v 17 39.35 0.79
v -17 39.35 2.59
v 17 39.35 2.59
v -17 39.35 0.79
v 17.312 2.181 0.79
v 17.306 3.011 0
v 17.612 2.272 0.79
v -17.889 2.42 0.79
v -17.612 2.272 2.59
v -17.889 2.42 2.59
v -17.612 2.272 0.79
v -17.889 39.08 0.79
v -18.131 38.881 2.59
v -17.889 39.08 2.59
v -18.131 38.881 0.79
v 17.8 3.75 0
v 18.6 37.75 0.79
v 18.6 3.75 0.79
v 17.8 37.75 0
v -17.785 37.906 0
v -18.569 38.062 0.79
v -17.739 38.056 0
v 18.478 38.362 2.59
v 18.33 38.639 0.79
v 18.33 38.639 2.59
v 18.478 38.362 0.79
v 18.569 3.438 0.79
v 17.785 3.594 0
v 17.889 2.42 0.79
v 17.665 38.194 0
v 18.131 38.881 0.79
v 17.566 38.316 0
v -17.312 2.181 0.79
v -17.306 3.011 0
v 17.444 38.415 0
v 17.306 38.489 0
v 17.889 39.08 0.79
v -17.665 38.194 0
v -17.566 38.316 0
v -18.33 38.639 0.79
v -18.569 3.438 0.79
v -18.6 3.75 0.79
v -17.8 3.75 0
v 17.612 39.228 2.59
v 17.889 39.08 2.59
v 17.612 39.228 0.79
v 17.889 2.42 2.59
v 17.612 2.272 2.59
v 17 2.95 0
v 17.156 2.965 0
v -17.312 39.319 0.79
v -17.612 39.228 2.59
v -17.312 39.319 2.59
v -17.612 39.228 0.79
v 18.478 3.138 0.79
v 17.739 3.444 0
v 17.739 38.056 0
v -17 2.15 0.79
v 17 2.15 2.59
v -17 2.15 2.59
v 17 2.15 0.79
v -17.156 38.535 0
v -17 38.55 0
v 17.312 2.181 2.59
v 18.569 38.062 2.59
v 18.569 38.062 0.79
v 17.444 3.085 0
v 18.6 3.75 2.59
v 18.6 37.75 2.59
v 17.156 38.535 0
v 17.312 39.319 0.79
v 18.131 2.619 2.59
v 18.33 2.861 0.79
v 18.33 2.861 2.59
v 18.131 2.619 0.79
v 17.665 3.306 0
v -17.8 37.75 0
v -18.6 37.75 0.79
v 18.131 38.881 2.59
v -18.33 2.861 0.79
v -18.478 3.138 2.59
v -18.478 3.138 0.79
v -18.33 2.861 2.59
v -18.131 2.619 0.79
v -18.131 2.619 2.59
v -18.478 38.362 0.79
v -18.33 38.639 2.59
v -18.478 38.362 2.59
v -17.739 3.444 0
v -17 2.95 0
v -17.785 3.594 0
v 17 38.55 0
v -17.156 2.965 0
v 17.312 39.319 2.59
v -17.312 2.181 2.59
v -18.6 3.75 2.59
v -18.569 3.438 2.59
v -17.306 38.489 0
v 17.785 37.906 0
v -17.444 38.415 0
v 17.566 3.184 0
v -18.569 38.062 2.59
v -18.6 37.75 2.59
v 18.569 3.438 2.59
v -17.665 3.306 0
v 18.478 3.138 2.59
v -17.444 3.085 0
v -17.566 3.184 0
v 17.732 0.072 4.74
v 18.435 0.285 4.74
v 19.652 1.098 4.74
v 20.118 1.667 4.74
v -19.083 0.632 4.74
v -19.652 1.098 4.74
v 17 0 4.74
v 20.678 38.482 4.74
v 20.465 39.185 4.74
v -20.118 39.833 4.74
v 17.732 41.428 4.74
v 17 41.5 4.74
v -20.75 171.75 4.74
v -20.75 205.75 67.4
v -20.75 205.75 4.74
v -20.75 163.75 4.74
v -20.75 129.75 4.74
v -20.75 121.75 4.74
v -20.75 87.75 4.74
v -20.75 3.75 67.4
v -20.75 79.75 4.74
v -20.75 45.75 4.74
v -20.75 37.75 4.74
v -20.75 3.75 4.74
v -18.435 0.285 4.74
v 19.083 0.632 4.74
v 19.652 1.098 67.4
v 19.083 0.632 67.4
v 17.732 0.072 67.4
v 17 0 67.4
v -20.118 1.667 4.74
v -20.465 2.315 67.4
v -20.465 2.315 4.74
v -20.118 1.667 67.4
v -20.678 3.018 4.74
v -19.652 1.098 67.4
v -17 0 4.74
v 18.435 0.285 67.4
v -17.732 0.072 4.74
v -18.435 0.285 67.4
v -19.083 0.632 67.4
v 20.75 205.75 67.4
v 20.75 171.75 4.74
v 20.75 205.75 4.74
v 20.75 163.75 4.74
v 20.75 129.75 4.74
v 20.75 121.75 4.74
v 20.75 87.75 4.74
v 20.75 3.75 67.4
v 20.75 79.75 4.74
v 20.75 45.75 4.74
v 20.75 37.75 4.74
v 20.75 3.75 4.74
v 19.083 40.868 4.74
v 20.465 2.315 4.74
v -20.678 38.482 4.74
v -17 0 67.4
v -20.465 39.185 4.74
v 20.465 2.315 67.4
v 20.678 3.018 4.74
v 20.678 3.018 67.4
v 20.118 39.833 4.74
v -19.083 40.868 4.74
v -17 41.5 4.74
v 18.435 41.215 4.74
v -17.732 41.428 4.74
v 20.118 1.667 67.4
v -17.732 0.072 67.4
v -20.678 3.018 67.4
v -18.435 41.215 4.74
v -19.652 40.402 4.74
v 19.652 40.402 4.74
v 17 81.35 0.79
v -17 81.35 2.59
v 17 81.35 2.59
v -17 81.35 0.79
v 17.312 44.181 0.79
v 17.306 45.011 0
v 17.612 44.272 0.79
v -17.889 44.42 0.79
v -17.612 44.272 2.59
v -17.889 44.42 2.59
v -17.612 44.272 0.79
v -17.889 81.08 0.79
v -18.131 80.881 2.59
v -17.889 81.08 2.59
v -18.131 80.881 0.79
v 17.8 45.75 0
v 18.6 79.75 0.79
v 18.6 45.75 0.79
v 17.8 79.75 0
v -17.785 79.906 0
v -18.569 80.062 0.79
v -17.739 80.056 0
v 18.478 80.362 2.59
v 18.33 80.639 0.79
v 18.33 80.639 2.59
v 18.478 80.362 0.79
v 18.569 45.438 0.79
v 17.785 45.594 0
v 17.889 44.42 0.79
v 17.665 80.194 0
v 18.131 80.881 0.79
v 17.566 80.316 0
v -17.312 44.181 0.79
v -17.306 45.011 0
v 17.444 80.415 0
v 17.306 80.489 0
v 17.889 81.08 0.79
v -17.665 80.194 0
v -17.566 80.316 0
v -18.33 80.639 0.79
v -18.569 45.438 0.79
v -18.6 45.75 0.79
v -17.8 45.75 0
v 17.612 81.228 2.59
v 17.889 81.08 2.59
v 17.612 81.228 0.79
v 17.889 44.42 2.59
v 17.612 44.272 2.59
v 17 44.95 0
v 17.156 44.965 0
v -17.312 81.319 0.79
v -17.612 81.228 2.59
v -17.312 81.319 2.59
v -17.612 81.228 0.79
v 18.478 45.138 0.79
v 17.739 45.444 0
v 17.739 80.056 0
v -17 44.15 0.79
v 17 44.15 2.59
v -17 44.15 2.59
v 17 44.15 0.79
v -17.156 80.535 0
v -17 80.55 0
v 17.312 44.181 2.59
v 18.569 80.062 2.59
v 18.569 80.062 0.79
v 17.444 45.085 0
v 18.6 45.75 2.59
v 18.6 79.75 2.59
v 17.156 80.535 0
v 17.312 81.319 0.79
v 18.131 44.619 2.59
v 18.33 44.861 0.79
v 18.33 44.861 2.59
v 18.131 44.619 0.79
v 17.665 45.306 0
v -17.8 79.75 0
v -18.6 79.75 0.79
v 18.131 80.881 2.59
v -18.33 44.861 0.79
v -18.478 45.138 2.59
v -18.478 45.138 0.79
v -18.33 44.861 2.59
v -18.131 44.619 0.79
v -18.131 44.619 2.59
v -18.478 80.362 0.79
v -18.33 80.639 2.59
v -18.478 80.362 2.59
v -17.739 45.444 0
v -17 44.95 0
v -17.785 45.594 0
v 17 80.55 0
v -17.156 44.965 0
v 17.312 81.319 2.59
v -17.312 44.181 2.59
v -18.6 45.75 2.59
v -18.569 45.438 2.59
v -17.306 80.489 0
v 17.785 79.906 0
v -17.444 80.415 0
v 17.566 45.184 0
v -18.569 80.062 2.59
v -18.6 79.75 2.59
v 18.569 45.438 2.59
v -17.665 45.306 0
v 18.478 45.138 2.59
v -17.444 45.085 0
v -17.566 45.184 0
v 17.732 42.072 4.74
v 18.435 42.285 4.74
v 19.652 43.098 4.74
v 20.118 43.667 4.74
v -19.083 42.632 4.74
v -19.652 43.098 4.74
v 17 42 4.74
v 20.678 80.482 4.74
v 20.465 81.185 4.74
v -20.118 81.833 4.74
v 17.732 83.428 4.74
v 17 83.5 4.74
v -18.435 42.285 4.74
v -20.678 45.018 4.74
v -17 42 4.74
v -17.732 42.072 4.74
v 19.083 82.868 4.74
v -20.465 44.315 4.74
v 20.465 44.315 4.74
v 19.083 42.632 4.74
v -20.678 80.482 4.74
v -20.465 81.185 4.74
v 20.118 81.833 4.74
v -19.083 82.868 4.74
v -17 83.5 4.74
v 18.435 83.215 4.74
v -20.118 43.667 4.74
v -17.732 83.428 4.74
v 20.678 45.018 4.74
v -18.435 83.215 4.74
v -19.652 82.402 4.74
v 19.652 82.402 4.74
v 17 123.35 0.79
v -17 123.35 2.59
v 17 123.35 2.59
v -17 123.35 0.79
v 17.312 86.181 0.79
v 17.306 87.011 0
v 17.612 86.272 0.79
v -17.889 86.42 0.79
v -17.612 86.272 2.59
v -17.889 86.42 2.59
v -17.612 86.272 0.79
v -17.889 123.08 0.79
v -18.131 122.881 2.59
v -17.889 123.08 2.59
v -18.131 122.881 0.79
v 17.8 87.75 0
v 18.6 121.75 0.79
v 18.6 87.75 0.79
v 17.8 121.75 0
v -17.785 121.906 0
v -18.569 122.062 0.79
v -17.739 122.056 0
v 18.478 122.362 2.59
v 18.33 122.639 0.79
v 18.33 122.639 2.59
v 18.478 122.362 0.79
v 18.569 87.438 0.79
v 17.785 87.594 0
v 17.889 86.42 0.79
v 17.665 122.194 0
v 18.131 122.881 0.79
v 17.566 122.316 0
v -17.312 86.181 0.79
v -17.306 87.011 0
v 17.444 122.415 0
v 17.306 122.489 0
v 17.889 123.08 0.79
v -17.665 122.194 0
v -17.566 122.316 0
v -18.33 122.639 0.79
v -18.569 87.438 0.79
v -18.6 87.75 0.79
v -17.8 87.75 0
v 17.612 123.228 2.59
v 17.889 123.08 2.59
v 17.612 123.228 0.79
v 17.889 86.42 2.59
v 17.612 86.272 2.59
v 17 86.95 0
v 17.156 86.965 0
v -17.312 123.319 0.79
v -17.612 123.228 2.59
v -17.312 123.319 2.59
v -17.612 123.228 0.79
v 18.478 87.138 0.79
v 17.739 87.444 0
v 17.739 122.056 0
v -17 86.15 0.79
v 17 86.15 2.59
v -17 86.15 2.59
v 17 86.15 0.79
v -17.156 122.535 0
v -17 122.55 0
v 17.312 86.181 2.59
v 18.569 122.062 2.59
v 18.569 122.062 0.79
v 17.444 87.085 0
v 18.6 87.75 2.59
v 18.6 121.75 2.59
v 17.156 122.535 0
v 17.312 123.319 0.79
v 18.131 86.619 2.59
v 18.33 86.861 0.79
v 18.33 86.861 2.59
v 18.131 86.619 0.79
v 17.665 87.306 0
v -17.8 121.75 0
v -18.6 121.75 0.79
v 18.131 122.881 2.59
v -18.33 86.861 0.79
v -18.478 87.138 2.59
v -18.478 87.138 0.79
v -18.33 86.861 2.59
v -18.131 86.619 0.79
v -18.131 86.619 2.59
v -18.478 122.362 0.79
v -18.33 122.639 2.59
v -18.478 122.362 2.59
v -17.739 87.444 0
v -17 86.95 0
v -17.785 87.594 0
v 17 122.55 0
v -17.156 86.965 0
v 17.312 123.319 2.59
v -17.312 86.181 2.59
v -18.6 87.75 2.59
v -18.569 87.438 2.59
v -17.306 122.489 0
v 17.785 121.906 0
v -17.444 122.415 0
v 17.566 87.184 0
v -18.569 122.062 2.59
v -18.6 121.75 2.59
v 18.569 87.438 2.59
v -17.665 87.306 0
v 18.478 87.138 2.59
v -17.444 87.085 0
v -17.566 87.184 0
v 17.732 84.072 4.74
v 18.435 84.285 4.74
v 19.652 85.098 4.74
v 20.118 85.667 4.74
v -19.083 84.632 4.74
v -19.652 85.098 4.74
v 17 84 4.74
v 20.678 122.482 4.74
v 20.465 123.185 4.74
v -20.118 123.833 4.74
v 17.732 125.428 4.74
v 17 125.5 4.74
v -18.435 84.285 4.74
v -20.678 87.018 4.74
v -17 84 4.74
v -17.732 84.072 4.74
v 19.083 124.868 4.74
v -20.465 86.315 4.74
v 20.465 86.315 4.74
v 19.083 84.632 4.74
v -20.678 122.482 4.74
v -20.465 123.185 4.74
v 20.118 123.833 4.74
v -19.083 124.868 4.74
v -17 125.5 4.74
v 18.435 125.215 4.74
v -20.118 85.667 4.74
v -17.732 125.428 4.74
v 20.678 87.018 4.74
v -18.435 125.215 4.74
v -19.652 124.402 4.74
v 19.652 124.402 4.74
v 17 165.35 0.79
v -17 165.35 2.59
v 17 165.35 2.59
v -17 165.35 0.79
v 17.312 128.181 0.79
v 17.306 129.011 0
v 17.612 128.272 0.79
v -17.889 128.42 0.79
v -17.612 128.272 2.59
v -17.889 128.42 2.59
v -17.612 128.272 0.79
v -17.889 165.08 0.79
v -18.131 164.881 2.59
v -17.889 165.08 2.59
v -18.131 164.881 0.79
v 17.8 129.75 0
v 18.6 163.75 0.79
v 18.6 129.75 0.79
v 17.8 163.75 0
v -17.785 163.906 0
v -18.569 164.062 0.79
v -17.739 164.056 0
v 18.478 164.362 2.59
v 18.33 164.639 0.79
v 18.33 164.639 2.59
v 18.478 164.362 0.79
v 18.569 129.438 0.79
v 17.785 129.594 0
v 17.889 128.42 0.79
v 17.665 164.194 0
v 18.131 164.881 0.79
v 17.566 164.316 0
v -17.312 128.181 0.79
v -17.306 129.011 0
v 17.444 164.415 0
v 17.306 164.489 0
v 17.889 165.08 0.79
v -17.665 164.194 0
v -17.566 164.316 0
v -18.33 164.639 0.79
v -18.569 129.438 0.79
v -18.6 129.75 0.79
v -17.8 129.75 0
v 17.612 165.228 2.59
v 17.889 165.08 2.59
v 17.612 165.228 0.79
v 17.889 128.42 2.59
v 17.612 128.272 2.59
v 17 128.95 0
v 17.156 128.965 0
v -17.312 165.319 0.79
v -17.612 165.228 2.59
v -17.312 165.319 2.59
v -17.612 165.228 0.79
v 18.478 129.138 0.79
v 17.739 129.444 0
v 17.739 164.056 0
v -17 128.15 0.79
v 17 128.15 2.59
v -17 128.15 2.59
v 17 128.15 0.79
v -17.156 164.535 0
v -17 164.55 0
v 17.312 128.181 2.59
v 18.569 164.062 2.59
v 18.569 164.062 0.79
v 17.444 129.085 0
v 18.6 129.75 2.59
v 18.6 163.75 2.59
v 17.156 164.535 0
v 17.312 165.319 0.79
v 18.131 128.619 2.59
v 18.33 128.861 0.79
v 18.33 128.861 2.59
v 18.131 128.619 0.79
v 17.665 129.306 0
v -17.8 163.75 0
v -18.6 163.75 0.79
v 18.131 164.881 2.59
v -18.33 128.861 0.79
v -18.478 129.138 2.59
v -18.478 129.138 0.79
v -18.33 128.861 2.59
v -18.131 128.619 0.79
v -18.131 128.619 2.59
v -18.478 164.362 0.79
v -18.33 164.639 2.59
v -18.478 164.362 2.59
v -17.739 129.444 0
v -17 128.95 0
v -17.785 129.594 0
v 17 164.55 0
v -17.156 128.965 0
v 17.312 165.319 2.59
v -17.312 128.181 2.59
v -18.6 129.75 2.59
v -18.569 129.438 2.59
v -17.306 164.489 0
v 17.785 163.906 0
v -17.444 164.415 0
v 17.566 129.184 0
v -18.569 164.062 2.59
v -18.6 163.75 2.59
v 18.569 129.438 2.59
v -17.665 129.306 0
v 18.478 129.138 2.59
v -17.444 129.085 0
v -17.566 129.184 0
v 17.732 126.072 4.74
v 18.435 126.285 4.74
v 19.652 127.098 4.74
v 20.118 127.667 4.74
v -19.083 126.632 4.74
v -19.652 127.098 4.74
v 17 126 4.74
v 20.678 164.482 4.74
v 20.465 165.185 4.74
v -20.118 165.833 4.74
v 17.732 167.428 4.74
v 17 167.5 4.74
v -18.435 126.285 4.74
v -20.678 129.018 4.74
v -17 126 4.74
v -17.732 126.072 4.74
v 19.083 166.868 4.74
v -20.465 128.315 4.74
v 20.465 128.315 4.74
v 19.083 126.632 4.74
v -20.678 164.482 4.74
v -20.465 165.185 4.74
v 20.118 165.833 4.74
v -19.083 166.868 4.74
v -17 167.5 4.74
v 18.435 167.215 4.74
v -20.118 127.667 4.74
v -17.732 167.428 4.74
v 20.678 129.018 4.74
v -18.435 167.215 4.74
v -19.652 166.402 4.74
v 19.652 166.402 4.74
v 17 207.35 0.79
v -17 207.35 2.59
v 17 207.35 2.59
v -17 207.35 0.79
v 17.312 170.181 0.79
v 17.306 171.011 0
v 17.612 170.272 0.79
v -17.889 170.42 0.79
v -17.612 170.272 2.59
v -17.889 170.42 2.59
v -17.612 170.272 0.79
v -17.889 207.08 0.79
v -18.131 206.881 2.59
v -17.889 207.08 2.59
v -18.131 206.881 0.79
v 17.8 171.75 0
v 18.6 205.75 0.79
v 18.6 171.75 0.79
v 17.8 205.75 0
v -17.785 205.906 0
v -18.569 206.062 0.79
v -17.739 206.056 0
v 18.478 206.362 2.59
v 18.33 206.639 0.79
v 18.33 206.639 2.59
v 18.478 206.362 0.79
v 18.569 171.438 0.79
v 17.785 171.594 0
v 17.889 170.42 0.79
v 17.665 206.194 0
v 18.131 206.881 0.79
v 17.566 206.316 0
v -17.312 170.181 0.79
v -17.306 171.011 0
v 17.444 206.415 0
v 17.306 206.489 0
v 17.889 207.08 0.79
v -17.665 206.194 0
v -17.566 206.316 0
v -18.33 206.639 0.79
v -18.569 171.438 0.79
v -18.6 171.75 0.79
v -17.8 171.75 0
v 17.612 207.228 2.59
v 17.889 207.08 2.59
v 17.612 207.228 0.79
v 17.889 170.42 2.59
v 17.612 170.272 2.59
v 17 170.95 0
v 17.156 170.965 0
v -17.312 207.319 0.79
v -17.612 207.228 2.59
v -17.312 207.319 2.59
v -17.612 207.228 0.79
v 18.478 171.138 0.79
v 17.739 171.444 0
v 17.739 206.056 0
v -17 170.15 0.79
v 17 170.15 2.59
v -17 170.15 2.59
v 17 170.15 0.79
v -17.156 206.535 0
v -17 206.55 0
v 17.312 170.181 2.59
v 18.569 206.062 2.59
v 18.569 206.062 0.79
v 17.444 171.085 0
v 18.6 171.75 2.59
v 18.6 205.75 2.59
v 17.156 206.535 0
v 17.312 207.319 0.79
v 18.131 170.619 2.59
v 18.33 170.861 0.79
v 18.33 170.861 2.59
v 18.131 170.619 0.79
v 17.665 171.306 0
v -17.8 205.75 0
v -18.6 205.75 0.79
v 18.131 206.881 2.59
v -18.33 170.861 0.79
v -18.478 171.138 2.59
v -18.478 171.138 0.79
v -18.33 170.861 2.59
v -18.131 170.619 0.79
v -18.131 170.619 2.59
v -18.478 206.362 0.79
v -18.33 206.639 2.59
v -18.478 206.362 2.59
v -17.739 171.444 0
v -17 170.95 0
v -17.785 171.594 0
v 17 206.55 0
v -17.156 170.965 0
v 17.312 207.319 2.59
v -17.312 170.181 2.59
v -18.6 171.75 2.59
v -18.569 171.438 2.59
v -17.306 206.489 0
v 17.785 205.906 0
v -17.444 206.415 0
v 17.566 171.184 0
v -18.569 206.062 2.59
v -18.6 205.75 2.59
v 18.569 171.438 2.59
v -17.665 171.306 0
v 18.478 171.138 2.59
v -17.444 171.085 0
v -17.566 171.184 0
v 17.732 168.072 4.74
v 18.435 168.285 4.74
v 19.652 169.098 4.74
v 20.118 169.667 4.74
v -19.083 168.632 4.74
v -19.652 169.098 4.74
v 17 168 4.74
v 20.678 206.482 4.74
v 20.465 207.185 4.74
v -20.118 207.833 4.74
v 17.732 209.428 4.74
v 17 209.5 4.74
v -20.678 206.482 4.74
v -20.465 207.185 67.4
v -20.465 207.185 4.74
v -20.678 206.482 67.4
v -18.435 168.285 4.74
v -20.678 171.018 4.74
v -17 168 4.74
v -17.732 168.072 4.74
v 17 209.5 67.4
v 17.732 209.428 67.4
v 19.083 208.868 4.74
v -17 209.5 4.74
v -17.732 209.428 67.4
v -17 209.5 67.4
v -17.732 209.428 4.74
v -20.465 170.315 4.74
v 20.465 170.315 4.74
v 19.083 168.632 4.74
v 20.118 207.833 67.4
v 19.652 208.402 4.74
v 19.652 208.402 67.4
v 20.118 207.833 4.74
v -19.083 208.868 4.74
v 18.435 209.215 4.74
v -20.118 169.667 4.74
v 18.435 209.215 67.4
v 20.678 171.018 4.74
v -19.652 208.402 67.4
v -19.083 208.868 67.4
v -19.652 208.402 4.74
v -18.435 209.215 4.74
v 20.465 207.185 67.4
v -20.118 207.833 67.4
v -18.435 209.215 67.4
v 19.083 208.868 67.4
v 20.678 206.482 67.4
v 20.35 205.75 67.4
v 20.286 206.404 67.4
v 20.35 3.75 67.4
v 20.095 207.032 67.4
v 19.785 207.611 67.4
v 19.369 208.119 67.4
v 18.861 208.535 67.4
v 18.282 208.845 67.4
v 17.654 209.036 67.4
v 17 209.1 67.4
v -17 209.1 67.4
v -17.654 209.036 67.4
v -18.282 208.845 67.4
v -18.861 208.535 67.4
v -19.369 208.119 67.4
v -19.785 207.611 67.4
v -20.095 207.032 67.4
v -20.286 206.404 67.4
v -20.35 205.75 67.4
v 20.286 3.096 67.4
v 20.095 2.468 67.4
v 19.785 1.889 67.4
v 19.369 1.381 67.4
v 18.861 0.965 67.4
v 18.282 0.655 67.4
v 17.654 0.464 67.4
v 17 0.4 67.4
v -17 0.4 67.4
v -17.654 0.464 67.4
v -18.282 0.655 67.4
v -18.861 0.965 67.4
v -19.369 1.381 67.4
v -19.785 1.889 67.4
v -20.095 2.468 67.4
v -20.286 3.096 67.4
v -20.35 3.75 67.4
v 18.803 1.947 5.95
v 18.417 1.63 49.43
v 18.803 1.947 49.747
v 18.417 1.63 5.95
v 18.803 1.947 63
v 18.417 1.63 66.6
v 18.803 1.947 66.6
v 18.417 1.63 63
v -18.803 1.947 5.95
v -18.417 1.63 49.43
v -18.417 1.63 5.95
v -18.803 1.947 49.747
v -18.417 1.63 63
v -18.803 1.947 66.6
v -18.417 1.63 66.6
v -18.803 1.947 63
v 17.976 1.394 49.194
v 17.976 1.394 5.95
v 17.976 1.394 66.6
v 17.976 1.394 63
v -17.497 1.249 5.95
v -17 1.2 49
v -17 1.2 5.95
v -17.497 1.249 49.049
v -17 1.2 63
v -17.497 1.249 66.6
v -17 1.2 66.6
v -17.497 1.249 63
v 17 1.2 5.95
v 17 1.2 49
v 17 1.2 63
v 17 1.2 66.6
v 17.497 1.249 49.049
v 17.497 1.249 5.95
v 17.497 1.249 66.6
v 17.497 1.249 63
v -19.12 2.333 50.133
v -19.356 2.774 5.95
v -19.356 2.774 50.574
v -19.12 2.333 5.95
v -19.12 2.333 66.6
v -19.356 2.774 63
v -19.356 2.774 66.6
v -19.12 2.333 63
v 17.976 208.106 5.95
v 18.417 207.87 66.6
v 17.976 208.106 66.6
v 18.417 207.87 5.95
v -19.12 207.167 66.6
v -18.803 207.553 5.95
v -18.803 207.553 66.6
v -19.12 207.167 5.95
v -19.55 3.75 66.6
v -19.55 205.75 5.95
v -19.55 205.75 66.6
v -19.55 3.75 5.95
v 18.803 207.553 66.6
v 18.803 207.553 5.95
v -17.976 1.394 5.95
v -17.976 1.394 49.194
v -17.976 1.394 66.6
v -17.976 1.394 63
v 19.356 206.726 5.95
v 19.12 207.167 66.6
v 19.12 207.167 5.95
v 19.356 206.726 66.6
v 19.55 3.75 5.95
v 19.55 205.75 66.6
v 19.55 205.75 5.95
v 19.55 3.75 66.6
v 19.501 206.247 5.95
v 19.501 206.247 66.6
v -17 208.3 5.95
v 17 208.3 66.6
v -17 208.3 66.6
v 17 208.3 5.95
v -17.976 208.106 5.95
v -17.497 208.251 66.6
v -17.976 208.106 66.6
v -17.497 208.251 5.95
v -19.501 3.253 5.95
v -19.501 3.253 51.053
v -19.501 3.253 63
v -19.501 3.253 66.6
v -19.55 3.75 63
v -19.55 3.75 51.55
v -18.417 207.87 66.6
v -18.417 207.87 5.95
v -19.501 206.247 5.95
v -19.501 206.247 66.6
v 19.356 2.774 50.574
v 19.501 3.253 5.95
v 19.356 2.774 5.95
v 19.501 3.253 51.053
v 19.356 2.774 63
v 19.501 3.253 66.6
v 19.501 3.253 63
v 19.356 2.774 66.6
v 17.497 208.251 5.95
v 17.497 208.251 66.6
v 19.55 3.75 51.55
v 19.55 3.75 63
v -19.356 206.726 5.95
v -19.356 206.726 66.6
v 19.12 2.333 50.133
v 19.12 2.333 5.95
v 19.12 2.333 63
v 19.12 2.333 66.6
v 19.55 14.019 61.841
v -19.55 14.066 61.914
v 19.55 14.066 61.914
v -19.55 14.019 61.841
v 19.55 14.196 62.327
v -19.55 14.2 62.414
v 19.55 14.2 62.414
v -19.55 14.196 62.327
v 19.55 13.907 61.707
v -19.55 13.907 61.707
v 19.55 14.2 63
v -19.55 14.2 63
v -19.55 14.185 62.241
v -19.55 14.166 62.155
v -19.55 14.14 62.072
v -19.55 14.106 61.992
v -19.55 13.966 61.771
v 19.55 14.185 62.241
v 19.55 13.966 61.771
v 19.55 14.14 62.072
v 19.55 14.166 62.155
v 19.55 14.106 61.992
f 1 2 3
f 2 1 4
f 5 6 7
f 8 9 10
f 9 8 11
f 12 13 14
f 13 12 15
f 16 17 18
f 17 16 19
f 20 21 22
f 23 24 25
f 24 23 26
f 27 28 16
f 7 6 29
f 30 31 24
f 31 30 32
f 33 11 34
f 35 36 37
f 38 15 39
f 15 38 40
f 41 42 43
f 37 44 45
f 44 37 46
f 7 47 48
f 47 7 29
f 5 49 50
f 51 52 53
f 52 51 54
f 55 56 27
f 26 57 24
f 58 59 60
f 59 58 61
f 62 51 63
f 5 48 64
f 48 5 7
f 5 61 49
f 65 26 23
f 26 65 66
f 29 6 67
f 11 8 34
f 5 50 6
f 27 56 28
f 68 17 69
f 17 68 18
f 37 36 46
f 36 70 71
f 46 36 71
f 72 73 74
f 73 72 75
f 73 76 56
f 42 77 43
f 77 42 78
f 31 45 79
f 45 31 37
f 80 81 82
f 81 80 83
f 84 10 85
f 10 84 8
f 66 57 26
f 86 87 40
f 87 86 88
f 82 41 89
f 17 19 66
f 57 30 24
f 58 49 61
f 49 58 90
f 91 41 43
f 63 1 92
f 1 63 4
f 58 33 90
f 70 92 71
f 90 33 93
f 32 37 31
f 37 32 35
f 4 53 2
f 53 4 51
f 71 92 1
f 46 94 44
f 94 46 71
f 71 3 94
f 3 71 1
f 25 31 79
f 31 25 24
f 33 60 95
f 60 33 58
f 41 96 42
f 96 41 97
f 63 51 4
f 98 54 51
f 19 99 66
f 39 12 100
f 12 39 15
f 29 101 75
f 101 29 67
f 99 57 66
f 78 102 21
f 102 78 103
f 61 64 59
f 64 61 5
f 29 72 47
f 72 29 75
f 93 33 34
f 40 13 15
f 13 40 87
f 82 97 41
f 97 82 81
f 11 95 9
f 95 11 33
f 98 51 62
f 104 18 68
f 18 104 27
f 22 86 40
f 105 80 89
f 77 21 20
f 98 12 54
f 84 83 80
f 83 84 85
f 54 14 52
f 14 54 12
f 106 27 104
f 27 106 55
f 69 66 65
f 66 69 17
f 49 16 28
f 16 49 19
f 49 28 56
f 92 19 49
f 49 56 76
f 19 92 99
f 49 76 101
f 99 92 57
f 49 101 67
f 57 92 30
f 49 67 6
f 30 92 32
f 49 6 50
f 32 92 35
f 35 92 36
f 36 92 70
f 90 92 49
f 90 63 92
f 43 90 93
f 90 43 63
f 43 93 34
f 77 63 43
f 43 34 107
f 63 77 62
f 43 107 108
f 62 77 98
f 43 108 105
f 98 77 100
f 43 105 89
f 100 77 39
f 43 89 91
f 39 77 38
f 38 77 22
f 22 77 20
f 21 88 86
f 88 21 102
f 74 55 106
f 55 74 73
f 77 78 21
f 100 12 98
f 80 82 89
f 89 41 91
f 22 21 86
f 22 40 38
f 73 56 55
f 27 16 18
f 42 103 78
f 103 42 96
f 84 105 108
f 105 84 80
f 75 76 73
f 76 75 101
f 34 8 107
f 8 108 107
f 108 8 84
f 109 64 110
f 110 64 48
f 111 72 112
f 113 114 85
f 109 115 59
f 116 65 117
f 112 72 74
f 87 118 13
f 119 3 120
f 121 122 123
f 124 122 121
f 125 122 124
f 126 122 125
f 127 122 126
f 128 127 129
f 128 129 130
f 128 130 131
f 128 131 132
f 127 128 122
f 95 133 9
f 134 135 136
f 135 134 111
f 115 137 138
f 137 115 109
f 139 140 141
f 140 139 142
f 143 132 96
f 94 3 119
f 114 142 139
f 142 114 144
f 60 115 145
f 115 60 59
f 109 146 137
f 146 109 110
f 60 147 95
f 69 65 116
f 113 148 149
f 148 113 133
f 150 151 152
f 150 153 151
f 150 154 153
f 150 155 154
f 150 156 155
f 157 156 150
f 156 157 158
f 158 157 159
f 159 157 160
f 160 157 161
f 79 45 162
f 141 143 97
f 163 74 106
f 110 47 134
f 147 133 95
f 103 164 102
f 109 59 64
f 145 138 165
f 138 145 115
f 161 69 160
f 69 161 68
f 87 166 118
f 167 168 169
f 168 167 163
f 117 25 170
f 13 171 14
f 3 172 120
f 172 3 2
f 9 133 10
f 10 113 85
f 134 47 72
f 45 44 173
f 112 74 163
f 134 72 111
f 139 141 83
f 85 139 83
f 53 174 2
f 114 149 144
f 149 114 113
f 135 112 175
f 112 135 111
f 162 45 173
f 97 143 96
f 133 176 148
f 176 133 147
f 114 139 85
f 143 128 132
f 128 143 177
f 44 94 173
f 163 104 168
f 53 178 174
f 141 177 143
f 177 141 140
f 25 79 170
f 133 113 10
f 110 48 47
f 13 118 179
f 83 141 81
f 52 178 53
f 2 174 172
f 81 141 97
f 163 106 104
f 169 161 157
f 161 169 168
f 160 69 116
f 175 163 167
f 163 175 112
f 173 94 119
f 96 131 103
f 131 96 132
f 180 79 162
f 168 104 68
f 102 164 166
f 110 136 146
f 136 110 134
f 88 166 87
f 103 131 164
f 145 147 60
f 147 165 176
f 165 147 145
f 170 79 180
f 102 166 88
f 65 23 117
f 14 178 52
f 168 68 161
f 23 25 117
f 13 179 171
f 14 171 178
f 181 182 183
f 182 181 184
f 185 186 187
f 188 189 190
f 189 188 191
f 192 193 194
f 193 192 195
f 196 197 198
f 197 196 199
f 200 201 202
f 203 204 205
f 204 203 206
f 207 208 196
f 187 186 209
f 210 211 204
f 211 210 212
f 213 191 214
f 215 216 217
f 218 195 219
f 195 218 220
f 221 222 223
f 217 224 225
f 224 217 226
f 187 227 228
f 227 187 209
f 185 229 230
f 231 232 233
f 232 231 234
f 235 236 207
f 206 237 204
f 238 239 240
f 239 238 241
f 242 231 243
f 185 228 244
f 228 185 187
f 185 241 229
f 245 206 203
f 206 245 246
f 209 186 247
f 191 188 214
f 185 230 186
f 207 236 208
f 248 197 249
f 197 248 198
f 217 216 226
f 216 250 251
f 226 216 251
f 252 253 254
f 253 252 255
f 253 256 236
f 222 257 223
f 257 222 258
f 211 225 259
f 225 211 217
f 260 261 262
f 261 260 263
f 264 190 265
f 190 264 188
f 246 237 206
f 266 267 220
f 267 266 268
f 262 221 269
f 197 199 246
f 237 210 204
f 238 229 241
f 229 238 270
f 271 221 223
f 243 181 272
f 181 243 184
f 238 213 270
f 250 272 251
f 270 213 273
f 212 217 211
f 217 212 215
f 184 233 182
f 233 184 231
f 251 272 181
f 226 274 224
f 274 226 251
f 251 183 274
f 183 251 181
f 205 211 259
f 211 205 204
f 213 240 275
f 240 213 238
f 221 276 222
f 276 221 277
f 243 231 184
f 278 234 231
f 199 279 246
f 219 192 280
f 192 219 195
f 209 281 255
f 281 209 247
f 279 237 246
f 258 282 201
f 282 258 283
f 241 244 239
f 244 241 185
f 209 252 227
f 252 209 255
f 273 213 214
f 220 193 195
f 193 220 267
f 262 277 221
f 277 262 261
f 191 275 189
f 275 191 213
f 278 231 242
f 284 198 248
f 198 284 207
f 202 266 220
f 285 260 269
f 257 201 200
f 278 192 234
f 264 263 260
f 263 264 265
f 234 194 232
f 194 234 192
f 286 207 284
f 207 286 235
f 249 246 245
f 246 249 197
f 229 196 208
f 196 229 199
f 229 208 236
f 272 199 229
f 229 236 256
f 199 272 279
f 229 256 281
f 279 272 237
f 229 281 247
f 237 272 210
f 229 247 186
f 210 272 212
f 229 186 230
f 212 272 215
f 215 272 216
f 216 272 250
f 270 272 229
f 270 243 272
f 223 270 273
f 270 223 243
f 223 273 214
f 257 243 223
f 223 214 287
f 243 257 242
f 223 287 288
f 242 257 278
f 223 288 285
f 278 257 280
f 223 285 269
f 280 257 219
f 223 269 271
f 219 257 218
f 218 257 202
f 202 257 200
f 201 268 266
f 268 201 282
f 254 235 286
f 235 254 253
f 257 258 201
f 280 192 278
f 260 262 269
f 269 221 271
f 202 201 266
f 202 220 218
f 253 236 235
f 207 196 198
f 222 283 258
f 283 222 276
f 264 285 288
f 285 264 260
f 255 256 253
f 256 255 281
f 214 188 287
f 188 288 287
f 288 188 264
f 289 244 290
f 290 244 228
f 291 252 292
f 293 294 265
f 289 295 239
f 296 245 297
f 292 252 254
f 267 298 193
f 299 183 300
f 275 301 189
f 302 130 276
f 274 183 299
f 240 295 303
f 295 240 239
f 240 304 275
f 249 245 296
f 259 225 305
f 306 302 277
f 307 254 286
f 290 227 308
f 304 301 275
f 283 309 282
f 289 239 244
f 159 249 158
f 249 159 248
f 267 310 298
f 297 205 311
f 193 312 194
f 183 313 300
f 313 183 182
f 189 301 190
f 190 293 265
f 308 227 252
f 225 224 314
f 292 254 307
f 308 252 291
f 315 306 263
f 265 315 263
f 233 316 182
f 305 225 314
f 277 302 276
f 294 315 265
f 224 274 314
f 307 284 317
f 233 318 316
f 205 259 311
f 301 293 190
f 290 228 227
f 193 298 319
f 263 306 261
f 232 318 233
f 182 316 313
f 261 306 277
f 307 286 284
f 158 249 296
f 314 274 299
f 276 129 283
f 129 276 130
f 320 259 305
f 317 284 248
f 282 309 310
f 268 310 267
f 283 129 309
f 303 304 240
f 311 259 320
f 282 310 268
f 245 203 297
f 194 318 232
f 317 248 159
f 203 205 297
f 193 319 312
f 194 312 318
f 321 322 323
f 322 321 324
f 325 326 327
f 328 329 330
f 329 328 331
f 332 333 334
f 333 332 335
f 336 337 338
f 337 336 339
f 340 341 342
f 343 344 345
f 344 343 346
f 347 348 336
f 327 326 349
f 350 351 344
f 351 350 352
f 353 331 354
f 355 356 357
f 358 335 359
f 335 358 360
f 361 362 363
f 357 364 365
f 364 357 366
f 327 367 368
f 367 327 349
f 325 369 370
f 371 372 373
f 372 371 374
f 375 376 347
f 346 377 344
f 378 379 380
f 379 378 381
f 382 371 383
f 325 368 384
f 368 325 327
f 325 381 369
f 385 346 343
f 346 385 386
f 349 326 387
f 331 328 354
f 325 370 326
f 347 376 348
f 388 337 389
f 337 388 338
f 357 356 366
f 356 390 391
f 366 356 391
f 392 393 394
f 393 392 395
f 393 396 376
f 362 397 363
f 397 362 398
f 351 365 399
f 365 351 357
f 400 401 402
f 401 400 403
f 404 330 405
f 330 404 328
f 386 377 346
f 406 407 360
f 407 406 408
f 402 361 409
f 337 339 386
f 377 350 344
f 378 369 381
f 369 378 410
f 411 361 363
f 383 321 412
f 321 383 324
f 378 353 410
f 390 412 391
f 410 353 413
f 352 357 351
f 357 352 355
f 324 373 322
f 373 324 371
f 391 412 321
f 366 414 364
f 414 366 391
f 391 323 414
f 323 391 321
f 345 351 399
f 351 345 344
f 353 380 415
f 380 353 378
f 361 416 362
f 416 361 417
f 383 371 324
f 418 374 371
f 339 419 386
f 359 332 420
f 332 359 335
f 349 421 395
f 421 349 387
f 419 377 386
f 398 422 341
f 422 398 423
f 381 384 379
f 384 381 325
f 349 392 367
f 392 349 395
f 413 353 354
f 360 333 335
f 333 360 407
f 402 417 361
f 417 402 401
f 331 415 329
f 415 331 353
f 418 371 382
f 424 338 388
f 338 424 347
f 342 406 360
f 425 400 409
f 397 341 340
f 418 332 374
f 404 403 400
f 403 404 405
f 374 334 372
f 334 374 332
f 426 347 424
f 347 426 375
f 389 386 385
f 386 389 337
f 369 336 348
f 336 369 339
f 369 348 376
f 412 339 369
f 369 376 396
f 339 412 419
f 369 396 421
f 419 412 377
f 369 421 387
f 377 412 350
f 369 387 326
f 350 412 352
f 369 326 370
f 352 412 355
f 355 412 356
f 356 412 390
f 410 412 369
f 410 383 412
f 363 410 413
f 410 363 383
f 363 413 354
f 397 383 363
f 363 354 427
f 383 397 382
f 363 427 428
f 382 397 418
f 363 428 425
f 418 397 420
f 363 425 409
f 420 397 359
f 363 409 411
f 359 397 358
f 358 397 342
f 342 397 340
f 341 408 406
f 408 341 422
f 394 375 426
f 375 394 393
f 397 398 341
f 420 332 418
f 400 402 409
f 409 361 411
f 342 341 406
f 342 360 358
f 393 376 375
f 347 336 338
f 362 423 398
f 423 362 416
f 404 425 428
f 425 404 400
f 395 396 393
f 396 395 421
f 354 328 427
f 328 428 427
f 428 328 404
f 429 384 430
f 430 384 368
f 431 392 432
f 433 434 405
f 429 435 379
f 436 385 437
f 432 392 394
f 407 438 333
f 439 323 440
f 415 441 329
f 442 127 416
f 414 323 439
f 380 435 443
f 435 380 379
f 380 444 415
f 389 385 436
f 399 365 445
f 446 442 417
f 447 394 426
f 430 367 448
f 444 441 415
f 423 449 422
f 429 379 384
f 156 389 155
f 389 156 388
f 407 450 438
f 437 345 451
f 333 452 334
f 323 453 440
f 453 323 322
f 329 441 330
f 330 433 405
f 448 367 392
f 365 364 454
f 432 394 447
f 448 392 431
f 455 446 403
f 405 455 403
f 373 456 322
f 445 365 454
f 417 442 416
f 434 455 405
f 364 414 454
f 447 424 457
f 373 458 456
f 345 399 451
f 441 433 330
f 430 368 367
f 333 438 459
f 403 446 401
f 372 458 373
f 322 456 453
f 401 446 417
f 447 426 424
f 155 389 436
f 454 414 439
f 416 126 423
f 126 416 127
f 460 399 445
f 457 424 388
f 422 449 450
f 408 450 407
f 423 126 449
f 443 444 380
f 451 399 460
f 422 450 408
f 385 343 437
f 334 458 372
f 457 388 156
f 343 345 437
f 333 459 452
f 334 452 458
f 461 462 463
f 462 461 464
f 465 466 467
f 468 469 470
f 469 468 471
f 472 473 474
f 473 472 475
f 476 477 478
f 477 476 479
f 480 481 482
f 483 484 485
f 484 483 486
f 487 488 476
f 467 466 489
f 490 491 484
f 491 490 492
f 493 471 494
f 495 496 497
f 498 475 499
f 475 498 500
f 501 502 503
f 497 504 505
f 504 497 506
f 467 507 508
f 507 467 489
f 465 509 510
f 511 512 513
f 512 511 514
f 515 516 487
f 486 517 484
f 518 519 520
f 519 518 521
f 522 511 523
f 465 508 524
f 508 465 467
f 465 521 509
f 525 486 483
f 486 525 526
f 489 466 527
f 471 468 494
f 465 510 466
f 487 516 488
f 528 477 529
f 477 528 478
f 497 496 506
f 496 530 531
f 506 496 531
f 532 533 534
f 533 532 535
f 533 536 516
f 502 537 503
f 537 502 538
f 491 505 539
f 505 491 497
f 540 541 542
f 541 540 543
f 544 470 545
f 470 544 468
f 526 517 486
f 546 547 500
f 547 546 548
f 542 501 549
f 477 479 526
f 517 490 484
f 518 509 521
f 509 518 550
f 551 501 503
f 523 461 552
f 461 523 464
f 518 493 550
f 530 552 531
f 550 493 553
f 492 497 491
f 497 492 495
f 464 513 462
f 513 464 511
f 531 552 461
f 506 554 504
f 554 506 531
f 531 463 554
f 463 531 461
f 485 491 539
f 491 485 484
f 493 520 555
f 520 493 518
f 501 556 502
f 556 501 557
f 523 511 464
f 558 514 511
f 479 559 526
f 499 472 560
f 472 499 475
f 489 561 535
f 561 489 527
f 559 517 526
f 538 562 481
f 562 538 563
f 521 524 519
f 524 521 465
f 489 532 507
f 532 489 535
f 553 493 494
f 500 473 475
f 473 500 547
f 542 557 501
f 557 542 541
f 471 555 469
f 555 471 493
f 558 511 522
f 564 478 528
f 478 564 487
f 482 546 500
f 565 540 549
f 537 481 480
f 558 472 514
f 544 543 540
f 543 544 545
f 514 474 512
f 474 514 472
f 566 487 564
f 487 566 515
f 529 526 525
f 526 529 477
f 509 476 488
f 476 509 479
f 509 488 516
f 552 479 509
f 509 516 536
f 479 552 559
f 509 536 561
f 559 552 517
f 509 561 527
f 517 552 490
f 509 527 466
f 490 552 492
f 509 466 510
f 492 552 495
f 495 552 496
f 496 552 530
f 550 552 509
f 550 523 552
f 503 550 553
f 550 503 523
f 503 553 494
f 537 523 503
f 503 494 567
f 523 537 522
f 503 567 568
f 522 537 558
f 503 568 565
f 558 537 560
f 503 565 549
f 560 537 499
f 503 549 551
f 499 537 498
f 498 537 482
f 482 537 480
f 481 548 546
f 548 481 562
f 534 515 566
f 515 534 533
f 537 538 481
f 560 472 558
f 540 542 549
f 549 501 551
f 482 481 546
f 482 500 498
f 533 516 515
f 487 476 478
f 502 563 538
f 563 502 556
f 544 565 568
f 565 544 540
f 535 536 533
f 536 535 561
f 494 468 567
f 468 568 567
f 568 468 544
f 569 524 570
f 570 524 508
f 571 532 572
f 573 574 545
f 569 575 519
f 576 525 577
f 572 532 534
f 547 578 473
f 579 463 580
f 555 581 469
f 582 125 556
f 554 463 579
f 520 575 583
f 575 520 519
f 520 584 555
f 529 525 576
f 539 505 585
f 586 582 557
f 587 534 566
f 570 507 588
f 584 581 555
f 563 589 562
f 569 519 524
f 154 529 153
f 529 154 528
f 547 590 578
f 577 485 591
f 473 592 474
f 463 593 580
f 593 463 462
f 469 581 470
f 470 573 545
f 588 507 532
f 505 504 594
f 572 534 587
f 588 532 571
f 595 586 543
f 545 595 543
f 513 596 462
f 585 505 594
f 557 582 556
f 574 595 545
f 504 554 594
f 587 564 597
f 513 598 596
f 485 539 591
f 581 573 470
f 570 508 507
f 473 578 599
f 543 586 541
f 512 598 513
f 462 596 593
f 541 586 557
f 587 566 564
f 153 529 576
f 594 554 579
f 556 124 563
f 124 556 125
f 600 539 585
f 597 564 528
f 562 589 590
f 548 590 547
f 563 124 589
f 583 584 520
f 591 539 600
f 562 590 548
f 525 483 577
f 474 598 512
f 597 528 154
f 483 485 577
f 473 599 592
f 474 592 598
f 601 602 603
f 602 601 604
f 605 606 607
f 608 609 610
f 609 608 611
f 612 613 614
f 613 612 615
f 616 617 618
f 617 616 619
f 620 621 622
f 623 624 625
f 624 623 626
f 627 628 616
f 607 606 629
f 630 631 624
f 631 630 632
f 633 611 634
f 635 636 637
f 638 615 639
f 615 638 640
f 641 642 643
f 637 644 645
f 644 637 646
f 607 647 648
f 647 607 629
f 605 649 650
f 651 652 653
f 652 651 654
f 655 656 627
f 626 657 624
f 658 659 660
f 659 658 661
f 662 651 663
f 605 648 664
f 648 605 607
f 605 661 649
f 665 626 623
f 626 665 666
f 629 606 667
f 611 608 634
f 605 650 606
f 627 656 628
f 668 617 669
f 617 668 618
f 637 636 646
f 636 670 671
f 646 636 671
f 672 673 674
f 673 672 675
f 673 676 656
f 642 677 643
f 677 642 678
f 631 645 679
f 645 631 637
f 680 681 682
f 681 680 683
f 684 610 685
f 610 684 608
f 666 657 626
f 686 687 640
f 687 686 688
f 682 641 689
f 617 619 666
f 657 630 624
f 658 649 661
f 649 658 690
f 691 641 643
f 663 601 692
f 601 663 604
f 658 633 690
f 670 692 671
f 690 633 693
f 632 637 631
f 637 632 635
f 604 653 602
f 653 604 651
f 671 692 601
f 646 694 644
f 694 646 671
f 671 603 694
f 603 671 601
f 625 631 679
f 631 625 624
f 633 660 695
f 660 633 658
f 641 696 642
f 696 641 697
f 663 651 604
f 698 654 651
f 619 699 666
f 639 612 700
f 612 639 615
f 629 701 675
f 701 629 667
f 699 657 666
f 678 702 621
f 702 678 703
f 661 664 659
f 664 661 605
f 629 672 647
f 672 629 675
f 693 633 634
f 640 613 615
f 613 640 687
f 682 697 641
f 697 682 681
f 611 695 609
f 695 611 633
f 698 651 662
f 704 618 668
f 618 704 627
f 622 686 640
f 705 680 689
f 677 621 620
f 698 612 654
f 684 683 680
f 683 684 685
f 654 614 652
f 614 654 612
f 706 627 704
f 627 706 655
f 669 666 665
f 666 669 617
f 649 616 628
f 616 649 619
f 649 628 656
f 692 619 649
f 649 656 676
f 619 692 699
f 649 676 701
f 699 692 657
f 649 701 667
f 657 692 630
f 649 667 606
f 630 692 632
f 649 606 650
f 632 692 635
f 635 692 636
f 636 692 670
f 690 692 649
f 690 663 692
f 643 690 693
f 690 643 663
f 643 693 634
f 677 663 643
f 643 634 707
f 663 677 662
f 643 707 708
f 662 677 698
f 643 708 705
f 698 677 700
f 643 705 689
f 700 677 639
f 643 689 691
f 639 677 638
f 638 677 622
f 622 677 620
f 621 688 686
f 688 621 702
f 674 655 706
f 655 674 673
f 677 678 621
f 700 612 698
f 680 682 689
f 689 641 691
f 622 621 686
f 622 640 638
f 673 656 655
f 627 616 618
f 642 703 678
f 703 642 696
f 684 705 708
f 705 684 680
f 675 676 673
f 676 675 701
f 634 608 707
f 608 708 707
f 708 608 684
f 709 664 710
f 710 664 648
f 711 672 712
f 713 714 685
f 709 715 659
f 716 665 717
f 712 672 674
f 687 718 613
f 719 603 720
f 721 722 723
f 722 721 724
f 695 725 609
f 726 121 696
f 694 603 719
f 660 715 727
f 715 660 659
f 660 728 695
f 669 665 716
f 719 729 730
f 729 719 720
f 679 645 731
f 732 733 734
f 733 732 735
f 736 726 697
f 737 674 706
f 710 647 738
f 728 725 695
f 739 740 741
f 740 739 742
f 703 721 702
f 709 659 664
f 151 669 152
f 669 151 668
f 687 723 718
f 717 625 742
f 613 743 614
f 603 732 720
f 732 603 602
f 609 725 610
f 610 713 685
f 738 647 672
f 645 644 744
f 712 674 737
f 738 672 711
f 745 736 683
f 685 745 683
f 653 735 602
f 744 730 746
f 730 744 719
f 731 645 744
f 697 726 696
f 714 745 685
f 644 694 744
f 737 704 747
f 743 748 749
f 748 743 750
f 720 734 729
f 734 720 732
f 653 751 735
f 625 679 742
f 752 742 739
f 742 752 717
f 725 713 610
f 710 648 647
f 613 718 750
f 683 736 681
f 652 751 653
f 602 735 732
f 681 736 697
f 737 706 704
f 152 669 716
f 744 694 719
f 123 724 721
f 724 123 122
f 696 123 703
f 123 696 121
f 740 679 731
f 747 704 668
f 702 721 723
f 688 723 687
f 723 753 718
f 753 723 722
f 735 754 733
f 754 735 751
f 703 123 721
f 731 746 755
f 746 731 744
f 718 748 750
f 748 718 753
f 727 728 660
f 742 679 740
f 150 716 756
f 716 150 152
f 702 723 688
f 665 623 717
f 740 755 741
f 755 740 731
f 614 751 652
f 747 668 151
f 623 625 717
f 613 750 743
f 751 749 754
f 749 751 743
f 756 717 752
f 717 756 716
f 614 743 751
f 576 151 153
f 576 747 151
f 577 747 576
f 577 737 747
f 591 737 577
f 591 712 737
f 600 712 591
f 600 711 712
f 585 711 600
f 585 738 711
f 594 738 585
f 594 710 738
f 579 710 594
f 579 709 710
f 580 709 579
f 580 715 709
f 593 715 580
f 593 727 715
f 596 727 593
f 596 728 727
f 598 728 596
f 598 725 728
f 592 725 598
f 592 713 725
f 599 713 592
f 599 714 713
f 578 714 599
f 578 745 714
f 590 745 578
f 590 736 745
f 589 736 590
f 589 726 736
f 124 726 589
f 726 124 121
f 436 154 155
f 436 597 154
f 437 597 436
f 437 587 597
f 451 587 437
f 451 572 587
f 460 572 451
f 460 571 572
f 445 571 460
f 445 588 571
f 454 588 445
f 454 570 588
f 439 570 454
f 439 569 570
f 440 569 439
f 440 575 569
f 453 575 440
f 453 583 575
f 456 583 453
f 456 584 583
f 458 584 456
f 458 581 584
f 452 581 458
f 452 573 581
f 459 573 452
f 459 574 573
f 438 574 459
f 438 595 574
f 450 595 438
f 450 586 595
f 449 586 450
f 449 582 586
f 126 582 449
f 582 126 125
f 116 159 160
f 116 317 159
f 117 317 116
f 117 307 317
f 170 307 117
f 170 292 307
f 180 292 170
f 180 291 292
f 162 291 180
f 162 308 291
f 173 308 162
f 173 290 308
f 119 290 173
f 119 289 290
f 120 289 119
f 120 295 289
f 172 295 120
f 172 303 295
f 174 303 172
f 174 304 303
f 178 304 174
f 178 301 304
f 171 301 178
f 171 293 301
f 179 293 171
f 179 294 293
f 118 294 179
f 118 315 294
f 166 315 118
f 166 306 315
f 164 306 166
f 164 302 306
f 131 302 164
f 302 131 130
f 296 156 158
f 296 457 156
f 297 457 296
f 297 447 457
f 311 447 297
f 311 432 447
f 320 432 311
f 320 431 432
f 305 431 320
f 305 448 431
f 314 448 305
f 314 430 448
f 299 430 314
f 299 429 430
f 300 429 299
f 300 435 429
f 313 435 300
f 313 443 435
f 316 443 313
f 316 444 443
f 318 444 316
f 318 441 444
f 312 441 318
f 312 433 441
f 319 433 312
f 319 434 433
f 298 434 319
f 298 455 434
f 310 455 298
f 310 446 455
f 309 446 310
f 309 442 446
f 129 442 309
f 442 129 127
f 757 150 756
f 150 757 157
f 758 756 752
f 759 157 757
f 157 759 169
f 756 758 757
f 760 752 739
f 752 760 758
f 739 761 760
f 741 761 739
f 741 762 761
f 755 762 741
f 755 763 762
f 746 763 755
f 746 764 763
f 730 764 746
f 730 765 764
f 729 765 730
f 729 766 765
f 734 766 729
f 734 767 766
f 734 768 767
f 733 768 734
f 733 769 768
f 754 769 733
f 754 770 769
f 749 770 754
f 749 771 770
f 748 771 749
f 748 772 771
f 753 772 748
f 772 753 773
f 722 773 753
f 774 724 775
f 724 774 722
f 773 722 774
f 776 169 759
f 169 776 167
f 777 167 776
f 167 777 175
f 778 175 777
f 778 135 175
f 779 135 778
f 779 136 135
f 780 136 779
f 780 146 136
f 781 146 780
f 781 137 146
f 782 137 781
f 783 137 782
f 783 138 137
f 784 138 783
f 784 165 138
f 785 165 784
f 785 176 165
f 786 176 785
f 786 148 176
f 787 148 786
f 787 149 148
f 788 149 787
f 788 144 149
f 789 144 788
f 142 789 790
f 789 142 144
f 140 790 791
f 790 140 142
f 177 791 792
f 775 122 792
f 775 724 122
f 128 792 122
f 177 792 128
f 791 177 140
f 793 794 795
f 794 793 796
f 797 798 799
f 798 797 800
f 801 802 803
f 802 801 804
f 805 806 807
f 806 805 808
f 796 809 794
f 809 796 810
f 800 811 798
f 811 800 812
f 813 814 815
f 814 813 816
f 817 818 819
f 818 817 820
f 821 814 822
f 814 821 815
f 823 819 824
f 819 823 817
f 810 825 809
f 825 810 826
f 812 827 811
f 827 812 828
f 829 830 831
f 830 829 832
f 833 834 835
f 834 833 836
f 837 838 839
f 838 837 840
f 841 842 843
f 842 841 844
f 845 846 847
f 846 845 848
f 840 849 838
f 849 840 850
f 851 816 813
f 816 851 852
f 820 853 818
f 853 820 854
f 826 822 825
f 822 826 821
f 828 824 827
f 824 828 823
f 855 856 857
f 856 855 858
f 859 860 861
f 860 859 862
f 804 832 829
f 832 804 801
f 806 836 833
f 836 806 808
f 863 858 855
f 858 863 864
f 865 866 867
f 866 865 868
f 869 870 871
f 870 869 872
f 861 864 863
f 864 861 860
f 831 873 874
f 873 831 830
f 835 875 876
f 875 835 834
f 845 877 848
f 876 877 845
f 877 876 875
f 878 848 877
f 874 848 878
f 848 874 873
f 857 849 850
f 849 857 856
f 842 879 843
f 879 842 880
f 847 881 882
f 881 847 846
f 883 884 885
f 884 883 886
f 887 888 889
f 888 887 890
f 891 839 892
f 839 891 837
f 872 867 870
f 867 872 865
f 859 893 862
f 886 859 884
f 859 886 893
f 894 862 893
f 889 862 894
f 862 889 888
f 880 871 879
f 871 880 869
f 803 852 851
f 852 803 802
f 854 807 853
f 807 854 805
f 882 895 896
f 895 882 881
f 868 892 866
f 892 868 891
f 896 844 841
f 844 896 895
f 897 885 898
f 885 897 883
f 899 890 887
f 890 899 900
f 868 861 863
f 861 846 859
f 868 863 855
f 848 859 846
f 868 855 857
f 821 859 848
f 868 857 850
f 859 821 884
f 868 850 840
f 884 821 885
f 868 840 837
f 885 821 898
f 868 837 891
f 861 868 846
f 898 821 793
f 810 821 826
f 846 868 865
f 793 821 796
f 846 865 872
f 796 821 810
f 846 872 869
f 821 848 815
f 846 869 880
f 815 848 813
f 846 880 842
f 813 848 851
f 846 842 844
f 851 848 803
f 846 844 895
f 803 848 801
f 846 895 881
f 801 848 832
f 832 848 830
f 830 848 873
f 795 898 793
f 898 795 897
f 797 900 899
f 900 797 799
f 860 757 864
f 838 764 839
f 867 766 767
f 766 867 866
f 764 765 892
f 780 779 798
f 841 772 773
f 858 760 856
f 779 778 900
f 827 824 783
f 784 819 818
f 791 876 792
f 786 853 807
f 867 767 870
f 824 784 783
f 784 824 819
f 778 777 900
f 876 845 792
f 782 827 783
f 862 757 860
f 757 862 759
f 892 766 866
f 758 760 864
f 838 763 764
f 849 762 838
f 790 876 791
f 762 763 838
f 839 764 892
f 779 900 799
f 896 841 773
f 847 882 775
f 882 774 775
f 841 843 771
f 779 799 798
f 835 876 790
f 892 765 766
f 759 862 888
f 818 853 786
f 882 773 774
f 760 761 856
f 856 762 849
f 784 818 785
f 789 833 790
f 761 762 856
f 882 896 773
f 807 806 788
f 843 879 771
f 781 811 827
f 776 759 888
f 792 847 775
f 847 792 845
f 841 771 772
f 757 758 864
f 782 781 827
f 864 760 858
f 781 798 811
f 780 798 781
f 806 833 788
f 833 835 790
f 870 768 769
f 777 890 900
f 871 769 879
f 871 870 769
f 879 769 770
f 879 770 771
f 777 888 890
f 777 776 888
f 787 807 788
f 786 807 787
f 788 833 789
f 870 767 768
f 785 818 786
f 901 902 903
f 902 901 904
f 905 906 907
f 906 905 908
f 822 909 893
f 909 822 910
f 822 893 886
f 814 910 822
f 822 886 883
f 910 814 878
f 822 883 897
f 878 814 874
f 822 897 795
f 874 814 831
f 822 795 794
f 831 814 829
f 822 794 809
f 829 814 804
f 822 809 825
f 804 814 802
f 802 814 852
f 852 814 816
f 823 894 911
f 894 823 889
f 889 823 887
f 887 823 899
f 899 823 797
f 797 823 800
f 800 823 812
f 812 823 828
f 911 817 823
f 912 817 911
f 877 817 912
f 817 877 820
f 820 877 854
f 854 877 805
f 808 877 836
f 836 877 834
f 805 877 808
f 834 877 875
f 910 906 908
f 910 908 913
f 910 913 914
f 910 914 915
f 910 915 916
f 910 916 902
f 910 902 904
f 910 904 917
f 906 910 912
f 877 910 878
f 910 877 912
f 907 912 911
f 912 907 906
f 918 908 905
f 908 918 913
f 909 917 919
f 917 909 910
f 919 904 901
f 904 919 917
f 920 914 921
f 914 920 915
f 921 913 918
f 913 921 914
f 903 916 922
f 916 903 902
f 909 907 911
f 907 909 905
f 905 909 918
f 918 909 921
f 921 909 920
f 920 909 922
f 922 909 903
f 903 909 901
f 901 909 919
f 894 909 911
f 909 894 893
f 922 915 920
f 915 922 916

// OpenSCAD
// file: ../../../modules/gridfinity.scad
// Gridfinity ベースプレートの共有 module。
// 寸法は Gridfinity 仕様 (Zack Freedman) の baseplate 輪郭に従う:
//   ピッチ 42、ソケット上端開口 41.5 (角 R4)、上から 45° 面取り 2.15 →
//   垂直 1.8 (37.2 角・R1.85) → 45° 面取り 0.7 → 底 35.8 角 (R1.15)。
//   ソケット深さ = 2.15 + 1.8 + 0.7 = 4.65。
//
// 座標系: X が列方向 (中央が 0)、Y が行方向 (板の前端が 0)、Z=0 が板の底面。
// 板の外形は grid とは独立に rim で与えるので、grid より大きい板 (縁付き) を
// 作れる。ソケットは rim=[left, right, front, back] の内側へ 42 ピッチで並ぶ。

gf_pitch = 42;
gf_socket_top = 41.5; // 上端開口
gf_socket_mid = 37.2; // 垂直部
gf_socket_bot = 35.8; // 底
gf_socket_r_top = 4;
gf_socket_r_mid = 1.85;
gf_socket_r_bot = 1.15;
gf_chamfer_top = 2.15;
gf_wall_h = 1.8;
gf_chamfer_bot = 0.7;
gf_socket_depth = gf_chamfer_top + gf_wall_h + gf_chamfer_bot; // 4.65
gf_fn = 32;
gf_eps = 0.01; // hull 用の薄板の厚さ
gf_over = 0.5; // 切削の抜き代

// 角丸正方形または矩形 (w は一辺、または [幅, 奥行き]、角 R)
module
gf_rounded_square(w, r)
{
    offset(r = r, $fn = gf_fn)
        square(is_list(w) ? w - [ 2 * r, 2 * r ] : w - 2 * r, center = true);
}

// 厚さ gf_eps の角丸正方形の薄板を z に置く (hull の骨)
module
gf_slab(w, r, z)
{
    translate([ 0, 0, z ]) linear_extrude(gf_eps) gf_rounded_square(w, r);
}

// ソケット1個の切削体。z=0 がソケットの底 (床の天面)、+Z へ 4.65 で天面に出る。
// clearance は嵌合の逃げで、輪郭を全周へ clearance だけ外へ出す (幅 +2c、角 R
// +c)。pitch_x は X 方向のセル幅。端数でも角 R と面取りの寸法を保つ。
module
gf_socket_cut(clearance = 0, pitch_x = gf_pitch)
{
    z1 = gf_chamfer_bot;
    z2 = z1 + gf_wall_h;
    z3 = gf_socket_depth;
    c = clearance;
    assert(pitch_x > gf_pitch - gf_socket_top + 2 * gf_socket_r_top,
           "Cell width is too small for the socket corner radius");
    delta = [ pitch_x - gf_pitch, 0 ];
    bot = [ gf_socket_bot + 2 * c, gf_socket_bot + 2 * c ] + delta;
    mid = [ gf_socket_mid + 2 * c, gf_socket_mid + 2 * c ] + delta;
    top = [ gf_socket_top + 2 * c, gf_socket_top + 2 * c ] + delta;
    hull()
    {
        gf_slab(bot, gf_socket_r_bot + c, 0);
        gf_slab(mid, gf_socket_r_mid + c, z1 - gf_eps);
    }
    hull()
    {
        gf_slab(mid, gf_socket_r_mid + c, z1 - gf_eps);
        gf_slab(mid, gf_socket_r_mid + c, z2 - gf_eps);
    }
    hull()
    {
        gf_slab(mid, gf_socket_r_mid + c, z2 - gf_eps);
        gf_slab(top, gf_socket_r_top + c, z3 - gf_eps);
    }
    // 天面より上へ抜く (天面と同一平面の退化した面を残さない)
    gf_slab(top, gf_socket_r_top + c, z3 - gf_eps);
    translate([ 0, 0, z3 - gf_eps ]) linear_extrude(gf_over + gf_eps)
        gf_rounded_square(top, gf_socket_r_top + c);
}

// ベースプレート。cols x rows のソケットを床 floor_t の上に彫る。
// rim = [left, right, front, back] はソケット列の外側に残す縁の幅。
// 板の幅 = cols*42 + left + right、奥行き = rows*42 + front + back。
// cols の端数は左端の細幅セルになる。rows は正の整数。
// clearance はソケットの嵌合の逃げ (gf_socket_cut を参照)。
module
gf_baseplate(cols, rows, rim = [ 0, 0, 0, 0 ], floor_t = 1, clearance = 0)
{
    grid_w = cols * gf_pitch;
    grid_d = rows * gf_pitch;
    plate_w = grid_w + rim[0] + rim[1];
    plate_d = grid_d + rim[2] + rim[3];
    x0 = -plate_w / 2 + rim[0]; // ソケット列の左端
    first_pitch = grid_w - (ceil(cols) - 1) * gf_pitch;
    difference()
    {
        translate([ -plate_w / 2, 0, 0 ])
            cube([ plate_w, plate_d, floor_t + gf_socket_depth ]);
        for (c = [0:ceil(cols) - 1], r = [0:rows - 1])
            translate([
                x0 + (c == 0 ? first_pitch / 2
                             : first_pitch + (c - 0.5) * gf_pitch),
                rim[2] + (r + 0.5) * gf_pitch,
                floor_t
            ]) gf_socket_cut(clearance, c == 0 ? first_pitch : gf_pitch);
    }
}
// file: ../../../modules/gridfinity_bins.scad
include <gridfinity_bin.scad>

// assets/gridfinity-bin/ の bin 群の共通値と、サイズ 3 引数の払い出し口。
// 単体では何も描かない。設計の経緯と確定値は
// ledger/designs/gridfinity-bin-4u.md が正本。
// 通常binは4U/9U、X={1,1.5,2,2.5,3} × Y={1,2,3,4,5,5.5}。
// 両軸に端数を持つ組み合わせはassetに置かない（各高さ28種）。
// Xが横、Yがラベルの壁から奥、unitsが高さ（7mm単位）。
wall = 1.2;    // 0.4 ノズル 3 本
floor_t = 1.2; // 底 (4.75) の上に載せる床。床の天面 z = 5.95
label_d = 13;  // 12mm 幅のラベルシールを貼る天板の張り出し
label_t = 1; // 天板の厚さ (user 指定)。下は 45° の無垢のくさび
label_r = 1; // 天板の先端と 45° 面の境目の R (user 指定)
// カードケース (goods/card_case_2x3x4u.scad) の値。カードは ISO/IEC 7810 ID-1 (85.6 × 54 ×
// 0.76、隅 R3) で、長辺を Y (rows 方向) に寝かせ、X 中央・手前の壁から 10 奥に置く。ポケットは
// カードより 1 大きい (片側 0.5)。右奥のマスは壁の内面まで抜き、床と底を外形に平行な 45° の窪みにする。
// ポケットの左右の埋めの天面 (幅 13.05) が 12mm のラベルを貼る帯。ポケットと穴の交点の
// 縦エッジは丸める (開口の上縁は丸めない: 壁を上端まで垂直に保ち、収まる枚数を減らさない)
card_w = 54;    // カードの短辺 (X)。user 指定「高さ 54」
card_d = 85.6;  // カードの長辺 (Y)。user 指定「幅 85.6」
card_clear = 1; // ポケットの余裕 (user 指定「+1mm」)
// ポケットの手前の辺の、手前の壁の内面からの距離 (user 指定「10mm」)
card_off = 10;
// ポケットの平面の隅 R (user 指定「角の丸み 3mm」。ID-1 の隅は 2.88..3.48)
card_r = 3;
// ポケットと穴が交わる所の、埋めの凸の縦エッジの R (指の当たる角)
card_edge_r = 2;
recess_skin = floor_t + 1.75; // 窪みの床 z (底の皮)。user 指定「壁厚と同じ 1.2 は過剰、1.75 返す」

function bin_contract(cols, rows, units) = str("CONTRACT units=",
                                               units,
                                               " pitch=",
                                               gf_pitch,
                                               " outer=",
                                               gfb_outer,
                                               " h=",
                                               units* gfb_unit,
                                               " lip=",
                                               gfb_lip_h,
                                               " base=",
                                               gfb_base_bot,
                                               "/",
                                               gfb_base_mid,
                                               "/",
                                               gfb_outer,
                                               " base_h=",
                                               gfb_base_h,
                                               " wall=",
                                               wall,
                                               " floor_top=",
                                               gfb_base_h + floor_t,
                                               " label=",
                                               label_d,
                                               "x",
                                               label_t,
                                               " wedge=45 fillet=",
                                               label_r,
                                               " bin=",
                                               cols,
                                               "x",
                                               rows,
                                               " size=",
                                               cols* gf_pitch - 0.5,
                                               "x",
                                               rows* gf_pitch - 0.5);

// (cols, rows, units) でラベル付き bin を払い出す。例: gridfinity_bin(2, 4, 4)
module
gridfinity_bin(cols, rows, units = 4)
{
    echo(bin_contract(cols, rows, units));
    gfb_bin(cols, rows, units, wall, floor_t, label_d, label_t, label_r);
}

function card_contract(cols, rows, units) = str("CONTRACT card units=",
                                                units,
                                                " bin=",
                                                cols,
                                                "x",
                                                rows,
                                                " size=",
                                                cols* gf_pitch - 0.5,
                                                "x",
                                                rows* gf_pitch - 0.5,
                                                " h=",
                                                units* gfb_unit,
                                                " lip=",
                                                gfb_lip_h,
                                                " floor_top=",
                                                gfb_base_h + floor_t,
                                                " card=",
                                                card_w,
                                                "x",
                                                card_d,
                                                " pocket=",
                                                card_w + card_clear,
                                                "x",
                                                card_d + card_clear,
                                                " at=",
                                                -(card_w + card_clear) / 2,
                                                ",",
                                                wall + card_off,
                                                " hole=",
                                                (cols - 1) / 2 * gf_pitch - gfb_outer / 2,
                                                ",",
                                                (rows - 0.5) * gf_pitch - 0.25 - gfb_outer / 2,
                                                " hole_r=",
                                                gfb_outer_r - wall,
                                                " recess=",
                                                gfb_outer - 2 * wall,
                                                "/",
                                                gfb_base_mid - 2 * wall,
                                                " recess_floor=",
                                                recess_skin,
                                                " r=",
                                                card_r,
                                                " edge_r=",
                                                card_edge_r);

// (cols, rows, units) でカードケースを払い出す。例: gridfinity_card_case(2, 3, 4)
module
gridfinity_card_case(cols, rows, units = 4)
{
    echo(card_contract(cols, rows, units));
    gfb_card_case(cols,
                  rows,
                  units,
                  wall,
                  floor_t,
                  [ card_w, card_d ],
                  card_clear,
                  card_off,
                  card_r,
                  recess_skin,
                  card_edge_r);
}
// main file
include <../../../modules/gridfinity_bins.scad>

gridfinity_bin(1, 5, 9);
